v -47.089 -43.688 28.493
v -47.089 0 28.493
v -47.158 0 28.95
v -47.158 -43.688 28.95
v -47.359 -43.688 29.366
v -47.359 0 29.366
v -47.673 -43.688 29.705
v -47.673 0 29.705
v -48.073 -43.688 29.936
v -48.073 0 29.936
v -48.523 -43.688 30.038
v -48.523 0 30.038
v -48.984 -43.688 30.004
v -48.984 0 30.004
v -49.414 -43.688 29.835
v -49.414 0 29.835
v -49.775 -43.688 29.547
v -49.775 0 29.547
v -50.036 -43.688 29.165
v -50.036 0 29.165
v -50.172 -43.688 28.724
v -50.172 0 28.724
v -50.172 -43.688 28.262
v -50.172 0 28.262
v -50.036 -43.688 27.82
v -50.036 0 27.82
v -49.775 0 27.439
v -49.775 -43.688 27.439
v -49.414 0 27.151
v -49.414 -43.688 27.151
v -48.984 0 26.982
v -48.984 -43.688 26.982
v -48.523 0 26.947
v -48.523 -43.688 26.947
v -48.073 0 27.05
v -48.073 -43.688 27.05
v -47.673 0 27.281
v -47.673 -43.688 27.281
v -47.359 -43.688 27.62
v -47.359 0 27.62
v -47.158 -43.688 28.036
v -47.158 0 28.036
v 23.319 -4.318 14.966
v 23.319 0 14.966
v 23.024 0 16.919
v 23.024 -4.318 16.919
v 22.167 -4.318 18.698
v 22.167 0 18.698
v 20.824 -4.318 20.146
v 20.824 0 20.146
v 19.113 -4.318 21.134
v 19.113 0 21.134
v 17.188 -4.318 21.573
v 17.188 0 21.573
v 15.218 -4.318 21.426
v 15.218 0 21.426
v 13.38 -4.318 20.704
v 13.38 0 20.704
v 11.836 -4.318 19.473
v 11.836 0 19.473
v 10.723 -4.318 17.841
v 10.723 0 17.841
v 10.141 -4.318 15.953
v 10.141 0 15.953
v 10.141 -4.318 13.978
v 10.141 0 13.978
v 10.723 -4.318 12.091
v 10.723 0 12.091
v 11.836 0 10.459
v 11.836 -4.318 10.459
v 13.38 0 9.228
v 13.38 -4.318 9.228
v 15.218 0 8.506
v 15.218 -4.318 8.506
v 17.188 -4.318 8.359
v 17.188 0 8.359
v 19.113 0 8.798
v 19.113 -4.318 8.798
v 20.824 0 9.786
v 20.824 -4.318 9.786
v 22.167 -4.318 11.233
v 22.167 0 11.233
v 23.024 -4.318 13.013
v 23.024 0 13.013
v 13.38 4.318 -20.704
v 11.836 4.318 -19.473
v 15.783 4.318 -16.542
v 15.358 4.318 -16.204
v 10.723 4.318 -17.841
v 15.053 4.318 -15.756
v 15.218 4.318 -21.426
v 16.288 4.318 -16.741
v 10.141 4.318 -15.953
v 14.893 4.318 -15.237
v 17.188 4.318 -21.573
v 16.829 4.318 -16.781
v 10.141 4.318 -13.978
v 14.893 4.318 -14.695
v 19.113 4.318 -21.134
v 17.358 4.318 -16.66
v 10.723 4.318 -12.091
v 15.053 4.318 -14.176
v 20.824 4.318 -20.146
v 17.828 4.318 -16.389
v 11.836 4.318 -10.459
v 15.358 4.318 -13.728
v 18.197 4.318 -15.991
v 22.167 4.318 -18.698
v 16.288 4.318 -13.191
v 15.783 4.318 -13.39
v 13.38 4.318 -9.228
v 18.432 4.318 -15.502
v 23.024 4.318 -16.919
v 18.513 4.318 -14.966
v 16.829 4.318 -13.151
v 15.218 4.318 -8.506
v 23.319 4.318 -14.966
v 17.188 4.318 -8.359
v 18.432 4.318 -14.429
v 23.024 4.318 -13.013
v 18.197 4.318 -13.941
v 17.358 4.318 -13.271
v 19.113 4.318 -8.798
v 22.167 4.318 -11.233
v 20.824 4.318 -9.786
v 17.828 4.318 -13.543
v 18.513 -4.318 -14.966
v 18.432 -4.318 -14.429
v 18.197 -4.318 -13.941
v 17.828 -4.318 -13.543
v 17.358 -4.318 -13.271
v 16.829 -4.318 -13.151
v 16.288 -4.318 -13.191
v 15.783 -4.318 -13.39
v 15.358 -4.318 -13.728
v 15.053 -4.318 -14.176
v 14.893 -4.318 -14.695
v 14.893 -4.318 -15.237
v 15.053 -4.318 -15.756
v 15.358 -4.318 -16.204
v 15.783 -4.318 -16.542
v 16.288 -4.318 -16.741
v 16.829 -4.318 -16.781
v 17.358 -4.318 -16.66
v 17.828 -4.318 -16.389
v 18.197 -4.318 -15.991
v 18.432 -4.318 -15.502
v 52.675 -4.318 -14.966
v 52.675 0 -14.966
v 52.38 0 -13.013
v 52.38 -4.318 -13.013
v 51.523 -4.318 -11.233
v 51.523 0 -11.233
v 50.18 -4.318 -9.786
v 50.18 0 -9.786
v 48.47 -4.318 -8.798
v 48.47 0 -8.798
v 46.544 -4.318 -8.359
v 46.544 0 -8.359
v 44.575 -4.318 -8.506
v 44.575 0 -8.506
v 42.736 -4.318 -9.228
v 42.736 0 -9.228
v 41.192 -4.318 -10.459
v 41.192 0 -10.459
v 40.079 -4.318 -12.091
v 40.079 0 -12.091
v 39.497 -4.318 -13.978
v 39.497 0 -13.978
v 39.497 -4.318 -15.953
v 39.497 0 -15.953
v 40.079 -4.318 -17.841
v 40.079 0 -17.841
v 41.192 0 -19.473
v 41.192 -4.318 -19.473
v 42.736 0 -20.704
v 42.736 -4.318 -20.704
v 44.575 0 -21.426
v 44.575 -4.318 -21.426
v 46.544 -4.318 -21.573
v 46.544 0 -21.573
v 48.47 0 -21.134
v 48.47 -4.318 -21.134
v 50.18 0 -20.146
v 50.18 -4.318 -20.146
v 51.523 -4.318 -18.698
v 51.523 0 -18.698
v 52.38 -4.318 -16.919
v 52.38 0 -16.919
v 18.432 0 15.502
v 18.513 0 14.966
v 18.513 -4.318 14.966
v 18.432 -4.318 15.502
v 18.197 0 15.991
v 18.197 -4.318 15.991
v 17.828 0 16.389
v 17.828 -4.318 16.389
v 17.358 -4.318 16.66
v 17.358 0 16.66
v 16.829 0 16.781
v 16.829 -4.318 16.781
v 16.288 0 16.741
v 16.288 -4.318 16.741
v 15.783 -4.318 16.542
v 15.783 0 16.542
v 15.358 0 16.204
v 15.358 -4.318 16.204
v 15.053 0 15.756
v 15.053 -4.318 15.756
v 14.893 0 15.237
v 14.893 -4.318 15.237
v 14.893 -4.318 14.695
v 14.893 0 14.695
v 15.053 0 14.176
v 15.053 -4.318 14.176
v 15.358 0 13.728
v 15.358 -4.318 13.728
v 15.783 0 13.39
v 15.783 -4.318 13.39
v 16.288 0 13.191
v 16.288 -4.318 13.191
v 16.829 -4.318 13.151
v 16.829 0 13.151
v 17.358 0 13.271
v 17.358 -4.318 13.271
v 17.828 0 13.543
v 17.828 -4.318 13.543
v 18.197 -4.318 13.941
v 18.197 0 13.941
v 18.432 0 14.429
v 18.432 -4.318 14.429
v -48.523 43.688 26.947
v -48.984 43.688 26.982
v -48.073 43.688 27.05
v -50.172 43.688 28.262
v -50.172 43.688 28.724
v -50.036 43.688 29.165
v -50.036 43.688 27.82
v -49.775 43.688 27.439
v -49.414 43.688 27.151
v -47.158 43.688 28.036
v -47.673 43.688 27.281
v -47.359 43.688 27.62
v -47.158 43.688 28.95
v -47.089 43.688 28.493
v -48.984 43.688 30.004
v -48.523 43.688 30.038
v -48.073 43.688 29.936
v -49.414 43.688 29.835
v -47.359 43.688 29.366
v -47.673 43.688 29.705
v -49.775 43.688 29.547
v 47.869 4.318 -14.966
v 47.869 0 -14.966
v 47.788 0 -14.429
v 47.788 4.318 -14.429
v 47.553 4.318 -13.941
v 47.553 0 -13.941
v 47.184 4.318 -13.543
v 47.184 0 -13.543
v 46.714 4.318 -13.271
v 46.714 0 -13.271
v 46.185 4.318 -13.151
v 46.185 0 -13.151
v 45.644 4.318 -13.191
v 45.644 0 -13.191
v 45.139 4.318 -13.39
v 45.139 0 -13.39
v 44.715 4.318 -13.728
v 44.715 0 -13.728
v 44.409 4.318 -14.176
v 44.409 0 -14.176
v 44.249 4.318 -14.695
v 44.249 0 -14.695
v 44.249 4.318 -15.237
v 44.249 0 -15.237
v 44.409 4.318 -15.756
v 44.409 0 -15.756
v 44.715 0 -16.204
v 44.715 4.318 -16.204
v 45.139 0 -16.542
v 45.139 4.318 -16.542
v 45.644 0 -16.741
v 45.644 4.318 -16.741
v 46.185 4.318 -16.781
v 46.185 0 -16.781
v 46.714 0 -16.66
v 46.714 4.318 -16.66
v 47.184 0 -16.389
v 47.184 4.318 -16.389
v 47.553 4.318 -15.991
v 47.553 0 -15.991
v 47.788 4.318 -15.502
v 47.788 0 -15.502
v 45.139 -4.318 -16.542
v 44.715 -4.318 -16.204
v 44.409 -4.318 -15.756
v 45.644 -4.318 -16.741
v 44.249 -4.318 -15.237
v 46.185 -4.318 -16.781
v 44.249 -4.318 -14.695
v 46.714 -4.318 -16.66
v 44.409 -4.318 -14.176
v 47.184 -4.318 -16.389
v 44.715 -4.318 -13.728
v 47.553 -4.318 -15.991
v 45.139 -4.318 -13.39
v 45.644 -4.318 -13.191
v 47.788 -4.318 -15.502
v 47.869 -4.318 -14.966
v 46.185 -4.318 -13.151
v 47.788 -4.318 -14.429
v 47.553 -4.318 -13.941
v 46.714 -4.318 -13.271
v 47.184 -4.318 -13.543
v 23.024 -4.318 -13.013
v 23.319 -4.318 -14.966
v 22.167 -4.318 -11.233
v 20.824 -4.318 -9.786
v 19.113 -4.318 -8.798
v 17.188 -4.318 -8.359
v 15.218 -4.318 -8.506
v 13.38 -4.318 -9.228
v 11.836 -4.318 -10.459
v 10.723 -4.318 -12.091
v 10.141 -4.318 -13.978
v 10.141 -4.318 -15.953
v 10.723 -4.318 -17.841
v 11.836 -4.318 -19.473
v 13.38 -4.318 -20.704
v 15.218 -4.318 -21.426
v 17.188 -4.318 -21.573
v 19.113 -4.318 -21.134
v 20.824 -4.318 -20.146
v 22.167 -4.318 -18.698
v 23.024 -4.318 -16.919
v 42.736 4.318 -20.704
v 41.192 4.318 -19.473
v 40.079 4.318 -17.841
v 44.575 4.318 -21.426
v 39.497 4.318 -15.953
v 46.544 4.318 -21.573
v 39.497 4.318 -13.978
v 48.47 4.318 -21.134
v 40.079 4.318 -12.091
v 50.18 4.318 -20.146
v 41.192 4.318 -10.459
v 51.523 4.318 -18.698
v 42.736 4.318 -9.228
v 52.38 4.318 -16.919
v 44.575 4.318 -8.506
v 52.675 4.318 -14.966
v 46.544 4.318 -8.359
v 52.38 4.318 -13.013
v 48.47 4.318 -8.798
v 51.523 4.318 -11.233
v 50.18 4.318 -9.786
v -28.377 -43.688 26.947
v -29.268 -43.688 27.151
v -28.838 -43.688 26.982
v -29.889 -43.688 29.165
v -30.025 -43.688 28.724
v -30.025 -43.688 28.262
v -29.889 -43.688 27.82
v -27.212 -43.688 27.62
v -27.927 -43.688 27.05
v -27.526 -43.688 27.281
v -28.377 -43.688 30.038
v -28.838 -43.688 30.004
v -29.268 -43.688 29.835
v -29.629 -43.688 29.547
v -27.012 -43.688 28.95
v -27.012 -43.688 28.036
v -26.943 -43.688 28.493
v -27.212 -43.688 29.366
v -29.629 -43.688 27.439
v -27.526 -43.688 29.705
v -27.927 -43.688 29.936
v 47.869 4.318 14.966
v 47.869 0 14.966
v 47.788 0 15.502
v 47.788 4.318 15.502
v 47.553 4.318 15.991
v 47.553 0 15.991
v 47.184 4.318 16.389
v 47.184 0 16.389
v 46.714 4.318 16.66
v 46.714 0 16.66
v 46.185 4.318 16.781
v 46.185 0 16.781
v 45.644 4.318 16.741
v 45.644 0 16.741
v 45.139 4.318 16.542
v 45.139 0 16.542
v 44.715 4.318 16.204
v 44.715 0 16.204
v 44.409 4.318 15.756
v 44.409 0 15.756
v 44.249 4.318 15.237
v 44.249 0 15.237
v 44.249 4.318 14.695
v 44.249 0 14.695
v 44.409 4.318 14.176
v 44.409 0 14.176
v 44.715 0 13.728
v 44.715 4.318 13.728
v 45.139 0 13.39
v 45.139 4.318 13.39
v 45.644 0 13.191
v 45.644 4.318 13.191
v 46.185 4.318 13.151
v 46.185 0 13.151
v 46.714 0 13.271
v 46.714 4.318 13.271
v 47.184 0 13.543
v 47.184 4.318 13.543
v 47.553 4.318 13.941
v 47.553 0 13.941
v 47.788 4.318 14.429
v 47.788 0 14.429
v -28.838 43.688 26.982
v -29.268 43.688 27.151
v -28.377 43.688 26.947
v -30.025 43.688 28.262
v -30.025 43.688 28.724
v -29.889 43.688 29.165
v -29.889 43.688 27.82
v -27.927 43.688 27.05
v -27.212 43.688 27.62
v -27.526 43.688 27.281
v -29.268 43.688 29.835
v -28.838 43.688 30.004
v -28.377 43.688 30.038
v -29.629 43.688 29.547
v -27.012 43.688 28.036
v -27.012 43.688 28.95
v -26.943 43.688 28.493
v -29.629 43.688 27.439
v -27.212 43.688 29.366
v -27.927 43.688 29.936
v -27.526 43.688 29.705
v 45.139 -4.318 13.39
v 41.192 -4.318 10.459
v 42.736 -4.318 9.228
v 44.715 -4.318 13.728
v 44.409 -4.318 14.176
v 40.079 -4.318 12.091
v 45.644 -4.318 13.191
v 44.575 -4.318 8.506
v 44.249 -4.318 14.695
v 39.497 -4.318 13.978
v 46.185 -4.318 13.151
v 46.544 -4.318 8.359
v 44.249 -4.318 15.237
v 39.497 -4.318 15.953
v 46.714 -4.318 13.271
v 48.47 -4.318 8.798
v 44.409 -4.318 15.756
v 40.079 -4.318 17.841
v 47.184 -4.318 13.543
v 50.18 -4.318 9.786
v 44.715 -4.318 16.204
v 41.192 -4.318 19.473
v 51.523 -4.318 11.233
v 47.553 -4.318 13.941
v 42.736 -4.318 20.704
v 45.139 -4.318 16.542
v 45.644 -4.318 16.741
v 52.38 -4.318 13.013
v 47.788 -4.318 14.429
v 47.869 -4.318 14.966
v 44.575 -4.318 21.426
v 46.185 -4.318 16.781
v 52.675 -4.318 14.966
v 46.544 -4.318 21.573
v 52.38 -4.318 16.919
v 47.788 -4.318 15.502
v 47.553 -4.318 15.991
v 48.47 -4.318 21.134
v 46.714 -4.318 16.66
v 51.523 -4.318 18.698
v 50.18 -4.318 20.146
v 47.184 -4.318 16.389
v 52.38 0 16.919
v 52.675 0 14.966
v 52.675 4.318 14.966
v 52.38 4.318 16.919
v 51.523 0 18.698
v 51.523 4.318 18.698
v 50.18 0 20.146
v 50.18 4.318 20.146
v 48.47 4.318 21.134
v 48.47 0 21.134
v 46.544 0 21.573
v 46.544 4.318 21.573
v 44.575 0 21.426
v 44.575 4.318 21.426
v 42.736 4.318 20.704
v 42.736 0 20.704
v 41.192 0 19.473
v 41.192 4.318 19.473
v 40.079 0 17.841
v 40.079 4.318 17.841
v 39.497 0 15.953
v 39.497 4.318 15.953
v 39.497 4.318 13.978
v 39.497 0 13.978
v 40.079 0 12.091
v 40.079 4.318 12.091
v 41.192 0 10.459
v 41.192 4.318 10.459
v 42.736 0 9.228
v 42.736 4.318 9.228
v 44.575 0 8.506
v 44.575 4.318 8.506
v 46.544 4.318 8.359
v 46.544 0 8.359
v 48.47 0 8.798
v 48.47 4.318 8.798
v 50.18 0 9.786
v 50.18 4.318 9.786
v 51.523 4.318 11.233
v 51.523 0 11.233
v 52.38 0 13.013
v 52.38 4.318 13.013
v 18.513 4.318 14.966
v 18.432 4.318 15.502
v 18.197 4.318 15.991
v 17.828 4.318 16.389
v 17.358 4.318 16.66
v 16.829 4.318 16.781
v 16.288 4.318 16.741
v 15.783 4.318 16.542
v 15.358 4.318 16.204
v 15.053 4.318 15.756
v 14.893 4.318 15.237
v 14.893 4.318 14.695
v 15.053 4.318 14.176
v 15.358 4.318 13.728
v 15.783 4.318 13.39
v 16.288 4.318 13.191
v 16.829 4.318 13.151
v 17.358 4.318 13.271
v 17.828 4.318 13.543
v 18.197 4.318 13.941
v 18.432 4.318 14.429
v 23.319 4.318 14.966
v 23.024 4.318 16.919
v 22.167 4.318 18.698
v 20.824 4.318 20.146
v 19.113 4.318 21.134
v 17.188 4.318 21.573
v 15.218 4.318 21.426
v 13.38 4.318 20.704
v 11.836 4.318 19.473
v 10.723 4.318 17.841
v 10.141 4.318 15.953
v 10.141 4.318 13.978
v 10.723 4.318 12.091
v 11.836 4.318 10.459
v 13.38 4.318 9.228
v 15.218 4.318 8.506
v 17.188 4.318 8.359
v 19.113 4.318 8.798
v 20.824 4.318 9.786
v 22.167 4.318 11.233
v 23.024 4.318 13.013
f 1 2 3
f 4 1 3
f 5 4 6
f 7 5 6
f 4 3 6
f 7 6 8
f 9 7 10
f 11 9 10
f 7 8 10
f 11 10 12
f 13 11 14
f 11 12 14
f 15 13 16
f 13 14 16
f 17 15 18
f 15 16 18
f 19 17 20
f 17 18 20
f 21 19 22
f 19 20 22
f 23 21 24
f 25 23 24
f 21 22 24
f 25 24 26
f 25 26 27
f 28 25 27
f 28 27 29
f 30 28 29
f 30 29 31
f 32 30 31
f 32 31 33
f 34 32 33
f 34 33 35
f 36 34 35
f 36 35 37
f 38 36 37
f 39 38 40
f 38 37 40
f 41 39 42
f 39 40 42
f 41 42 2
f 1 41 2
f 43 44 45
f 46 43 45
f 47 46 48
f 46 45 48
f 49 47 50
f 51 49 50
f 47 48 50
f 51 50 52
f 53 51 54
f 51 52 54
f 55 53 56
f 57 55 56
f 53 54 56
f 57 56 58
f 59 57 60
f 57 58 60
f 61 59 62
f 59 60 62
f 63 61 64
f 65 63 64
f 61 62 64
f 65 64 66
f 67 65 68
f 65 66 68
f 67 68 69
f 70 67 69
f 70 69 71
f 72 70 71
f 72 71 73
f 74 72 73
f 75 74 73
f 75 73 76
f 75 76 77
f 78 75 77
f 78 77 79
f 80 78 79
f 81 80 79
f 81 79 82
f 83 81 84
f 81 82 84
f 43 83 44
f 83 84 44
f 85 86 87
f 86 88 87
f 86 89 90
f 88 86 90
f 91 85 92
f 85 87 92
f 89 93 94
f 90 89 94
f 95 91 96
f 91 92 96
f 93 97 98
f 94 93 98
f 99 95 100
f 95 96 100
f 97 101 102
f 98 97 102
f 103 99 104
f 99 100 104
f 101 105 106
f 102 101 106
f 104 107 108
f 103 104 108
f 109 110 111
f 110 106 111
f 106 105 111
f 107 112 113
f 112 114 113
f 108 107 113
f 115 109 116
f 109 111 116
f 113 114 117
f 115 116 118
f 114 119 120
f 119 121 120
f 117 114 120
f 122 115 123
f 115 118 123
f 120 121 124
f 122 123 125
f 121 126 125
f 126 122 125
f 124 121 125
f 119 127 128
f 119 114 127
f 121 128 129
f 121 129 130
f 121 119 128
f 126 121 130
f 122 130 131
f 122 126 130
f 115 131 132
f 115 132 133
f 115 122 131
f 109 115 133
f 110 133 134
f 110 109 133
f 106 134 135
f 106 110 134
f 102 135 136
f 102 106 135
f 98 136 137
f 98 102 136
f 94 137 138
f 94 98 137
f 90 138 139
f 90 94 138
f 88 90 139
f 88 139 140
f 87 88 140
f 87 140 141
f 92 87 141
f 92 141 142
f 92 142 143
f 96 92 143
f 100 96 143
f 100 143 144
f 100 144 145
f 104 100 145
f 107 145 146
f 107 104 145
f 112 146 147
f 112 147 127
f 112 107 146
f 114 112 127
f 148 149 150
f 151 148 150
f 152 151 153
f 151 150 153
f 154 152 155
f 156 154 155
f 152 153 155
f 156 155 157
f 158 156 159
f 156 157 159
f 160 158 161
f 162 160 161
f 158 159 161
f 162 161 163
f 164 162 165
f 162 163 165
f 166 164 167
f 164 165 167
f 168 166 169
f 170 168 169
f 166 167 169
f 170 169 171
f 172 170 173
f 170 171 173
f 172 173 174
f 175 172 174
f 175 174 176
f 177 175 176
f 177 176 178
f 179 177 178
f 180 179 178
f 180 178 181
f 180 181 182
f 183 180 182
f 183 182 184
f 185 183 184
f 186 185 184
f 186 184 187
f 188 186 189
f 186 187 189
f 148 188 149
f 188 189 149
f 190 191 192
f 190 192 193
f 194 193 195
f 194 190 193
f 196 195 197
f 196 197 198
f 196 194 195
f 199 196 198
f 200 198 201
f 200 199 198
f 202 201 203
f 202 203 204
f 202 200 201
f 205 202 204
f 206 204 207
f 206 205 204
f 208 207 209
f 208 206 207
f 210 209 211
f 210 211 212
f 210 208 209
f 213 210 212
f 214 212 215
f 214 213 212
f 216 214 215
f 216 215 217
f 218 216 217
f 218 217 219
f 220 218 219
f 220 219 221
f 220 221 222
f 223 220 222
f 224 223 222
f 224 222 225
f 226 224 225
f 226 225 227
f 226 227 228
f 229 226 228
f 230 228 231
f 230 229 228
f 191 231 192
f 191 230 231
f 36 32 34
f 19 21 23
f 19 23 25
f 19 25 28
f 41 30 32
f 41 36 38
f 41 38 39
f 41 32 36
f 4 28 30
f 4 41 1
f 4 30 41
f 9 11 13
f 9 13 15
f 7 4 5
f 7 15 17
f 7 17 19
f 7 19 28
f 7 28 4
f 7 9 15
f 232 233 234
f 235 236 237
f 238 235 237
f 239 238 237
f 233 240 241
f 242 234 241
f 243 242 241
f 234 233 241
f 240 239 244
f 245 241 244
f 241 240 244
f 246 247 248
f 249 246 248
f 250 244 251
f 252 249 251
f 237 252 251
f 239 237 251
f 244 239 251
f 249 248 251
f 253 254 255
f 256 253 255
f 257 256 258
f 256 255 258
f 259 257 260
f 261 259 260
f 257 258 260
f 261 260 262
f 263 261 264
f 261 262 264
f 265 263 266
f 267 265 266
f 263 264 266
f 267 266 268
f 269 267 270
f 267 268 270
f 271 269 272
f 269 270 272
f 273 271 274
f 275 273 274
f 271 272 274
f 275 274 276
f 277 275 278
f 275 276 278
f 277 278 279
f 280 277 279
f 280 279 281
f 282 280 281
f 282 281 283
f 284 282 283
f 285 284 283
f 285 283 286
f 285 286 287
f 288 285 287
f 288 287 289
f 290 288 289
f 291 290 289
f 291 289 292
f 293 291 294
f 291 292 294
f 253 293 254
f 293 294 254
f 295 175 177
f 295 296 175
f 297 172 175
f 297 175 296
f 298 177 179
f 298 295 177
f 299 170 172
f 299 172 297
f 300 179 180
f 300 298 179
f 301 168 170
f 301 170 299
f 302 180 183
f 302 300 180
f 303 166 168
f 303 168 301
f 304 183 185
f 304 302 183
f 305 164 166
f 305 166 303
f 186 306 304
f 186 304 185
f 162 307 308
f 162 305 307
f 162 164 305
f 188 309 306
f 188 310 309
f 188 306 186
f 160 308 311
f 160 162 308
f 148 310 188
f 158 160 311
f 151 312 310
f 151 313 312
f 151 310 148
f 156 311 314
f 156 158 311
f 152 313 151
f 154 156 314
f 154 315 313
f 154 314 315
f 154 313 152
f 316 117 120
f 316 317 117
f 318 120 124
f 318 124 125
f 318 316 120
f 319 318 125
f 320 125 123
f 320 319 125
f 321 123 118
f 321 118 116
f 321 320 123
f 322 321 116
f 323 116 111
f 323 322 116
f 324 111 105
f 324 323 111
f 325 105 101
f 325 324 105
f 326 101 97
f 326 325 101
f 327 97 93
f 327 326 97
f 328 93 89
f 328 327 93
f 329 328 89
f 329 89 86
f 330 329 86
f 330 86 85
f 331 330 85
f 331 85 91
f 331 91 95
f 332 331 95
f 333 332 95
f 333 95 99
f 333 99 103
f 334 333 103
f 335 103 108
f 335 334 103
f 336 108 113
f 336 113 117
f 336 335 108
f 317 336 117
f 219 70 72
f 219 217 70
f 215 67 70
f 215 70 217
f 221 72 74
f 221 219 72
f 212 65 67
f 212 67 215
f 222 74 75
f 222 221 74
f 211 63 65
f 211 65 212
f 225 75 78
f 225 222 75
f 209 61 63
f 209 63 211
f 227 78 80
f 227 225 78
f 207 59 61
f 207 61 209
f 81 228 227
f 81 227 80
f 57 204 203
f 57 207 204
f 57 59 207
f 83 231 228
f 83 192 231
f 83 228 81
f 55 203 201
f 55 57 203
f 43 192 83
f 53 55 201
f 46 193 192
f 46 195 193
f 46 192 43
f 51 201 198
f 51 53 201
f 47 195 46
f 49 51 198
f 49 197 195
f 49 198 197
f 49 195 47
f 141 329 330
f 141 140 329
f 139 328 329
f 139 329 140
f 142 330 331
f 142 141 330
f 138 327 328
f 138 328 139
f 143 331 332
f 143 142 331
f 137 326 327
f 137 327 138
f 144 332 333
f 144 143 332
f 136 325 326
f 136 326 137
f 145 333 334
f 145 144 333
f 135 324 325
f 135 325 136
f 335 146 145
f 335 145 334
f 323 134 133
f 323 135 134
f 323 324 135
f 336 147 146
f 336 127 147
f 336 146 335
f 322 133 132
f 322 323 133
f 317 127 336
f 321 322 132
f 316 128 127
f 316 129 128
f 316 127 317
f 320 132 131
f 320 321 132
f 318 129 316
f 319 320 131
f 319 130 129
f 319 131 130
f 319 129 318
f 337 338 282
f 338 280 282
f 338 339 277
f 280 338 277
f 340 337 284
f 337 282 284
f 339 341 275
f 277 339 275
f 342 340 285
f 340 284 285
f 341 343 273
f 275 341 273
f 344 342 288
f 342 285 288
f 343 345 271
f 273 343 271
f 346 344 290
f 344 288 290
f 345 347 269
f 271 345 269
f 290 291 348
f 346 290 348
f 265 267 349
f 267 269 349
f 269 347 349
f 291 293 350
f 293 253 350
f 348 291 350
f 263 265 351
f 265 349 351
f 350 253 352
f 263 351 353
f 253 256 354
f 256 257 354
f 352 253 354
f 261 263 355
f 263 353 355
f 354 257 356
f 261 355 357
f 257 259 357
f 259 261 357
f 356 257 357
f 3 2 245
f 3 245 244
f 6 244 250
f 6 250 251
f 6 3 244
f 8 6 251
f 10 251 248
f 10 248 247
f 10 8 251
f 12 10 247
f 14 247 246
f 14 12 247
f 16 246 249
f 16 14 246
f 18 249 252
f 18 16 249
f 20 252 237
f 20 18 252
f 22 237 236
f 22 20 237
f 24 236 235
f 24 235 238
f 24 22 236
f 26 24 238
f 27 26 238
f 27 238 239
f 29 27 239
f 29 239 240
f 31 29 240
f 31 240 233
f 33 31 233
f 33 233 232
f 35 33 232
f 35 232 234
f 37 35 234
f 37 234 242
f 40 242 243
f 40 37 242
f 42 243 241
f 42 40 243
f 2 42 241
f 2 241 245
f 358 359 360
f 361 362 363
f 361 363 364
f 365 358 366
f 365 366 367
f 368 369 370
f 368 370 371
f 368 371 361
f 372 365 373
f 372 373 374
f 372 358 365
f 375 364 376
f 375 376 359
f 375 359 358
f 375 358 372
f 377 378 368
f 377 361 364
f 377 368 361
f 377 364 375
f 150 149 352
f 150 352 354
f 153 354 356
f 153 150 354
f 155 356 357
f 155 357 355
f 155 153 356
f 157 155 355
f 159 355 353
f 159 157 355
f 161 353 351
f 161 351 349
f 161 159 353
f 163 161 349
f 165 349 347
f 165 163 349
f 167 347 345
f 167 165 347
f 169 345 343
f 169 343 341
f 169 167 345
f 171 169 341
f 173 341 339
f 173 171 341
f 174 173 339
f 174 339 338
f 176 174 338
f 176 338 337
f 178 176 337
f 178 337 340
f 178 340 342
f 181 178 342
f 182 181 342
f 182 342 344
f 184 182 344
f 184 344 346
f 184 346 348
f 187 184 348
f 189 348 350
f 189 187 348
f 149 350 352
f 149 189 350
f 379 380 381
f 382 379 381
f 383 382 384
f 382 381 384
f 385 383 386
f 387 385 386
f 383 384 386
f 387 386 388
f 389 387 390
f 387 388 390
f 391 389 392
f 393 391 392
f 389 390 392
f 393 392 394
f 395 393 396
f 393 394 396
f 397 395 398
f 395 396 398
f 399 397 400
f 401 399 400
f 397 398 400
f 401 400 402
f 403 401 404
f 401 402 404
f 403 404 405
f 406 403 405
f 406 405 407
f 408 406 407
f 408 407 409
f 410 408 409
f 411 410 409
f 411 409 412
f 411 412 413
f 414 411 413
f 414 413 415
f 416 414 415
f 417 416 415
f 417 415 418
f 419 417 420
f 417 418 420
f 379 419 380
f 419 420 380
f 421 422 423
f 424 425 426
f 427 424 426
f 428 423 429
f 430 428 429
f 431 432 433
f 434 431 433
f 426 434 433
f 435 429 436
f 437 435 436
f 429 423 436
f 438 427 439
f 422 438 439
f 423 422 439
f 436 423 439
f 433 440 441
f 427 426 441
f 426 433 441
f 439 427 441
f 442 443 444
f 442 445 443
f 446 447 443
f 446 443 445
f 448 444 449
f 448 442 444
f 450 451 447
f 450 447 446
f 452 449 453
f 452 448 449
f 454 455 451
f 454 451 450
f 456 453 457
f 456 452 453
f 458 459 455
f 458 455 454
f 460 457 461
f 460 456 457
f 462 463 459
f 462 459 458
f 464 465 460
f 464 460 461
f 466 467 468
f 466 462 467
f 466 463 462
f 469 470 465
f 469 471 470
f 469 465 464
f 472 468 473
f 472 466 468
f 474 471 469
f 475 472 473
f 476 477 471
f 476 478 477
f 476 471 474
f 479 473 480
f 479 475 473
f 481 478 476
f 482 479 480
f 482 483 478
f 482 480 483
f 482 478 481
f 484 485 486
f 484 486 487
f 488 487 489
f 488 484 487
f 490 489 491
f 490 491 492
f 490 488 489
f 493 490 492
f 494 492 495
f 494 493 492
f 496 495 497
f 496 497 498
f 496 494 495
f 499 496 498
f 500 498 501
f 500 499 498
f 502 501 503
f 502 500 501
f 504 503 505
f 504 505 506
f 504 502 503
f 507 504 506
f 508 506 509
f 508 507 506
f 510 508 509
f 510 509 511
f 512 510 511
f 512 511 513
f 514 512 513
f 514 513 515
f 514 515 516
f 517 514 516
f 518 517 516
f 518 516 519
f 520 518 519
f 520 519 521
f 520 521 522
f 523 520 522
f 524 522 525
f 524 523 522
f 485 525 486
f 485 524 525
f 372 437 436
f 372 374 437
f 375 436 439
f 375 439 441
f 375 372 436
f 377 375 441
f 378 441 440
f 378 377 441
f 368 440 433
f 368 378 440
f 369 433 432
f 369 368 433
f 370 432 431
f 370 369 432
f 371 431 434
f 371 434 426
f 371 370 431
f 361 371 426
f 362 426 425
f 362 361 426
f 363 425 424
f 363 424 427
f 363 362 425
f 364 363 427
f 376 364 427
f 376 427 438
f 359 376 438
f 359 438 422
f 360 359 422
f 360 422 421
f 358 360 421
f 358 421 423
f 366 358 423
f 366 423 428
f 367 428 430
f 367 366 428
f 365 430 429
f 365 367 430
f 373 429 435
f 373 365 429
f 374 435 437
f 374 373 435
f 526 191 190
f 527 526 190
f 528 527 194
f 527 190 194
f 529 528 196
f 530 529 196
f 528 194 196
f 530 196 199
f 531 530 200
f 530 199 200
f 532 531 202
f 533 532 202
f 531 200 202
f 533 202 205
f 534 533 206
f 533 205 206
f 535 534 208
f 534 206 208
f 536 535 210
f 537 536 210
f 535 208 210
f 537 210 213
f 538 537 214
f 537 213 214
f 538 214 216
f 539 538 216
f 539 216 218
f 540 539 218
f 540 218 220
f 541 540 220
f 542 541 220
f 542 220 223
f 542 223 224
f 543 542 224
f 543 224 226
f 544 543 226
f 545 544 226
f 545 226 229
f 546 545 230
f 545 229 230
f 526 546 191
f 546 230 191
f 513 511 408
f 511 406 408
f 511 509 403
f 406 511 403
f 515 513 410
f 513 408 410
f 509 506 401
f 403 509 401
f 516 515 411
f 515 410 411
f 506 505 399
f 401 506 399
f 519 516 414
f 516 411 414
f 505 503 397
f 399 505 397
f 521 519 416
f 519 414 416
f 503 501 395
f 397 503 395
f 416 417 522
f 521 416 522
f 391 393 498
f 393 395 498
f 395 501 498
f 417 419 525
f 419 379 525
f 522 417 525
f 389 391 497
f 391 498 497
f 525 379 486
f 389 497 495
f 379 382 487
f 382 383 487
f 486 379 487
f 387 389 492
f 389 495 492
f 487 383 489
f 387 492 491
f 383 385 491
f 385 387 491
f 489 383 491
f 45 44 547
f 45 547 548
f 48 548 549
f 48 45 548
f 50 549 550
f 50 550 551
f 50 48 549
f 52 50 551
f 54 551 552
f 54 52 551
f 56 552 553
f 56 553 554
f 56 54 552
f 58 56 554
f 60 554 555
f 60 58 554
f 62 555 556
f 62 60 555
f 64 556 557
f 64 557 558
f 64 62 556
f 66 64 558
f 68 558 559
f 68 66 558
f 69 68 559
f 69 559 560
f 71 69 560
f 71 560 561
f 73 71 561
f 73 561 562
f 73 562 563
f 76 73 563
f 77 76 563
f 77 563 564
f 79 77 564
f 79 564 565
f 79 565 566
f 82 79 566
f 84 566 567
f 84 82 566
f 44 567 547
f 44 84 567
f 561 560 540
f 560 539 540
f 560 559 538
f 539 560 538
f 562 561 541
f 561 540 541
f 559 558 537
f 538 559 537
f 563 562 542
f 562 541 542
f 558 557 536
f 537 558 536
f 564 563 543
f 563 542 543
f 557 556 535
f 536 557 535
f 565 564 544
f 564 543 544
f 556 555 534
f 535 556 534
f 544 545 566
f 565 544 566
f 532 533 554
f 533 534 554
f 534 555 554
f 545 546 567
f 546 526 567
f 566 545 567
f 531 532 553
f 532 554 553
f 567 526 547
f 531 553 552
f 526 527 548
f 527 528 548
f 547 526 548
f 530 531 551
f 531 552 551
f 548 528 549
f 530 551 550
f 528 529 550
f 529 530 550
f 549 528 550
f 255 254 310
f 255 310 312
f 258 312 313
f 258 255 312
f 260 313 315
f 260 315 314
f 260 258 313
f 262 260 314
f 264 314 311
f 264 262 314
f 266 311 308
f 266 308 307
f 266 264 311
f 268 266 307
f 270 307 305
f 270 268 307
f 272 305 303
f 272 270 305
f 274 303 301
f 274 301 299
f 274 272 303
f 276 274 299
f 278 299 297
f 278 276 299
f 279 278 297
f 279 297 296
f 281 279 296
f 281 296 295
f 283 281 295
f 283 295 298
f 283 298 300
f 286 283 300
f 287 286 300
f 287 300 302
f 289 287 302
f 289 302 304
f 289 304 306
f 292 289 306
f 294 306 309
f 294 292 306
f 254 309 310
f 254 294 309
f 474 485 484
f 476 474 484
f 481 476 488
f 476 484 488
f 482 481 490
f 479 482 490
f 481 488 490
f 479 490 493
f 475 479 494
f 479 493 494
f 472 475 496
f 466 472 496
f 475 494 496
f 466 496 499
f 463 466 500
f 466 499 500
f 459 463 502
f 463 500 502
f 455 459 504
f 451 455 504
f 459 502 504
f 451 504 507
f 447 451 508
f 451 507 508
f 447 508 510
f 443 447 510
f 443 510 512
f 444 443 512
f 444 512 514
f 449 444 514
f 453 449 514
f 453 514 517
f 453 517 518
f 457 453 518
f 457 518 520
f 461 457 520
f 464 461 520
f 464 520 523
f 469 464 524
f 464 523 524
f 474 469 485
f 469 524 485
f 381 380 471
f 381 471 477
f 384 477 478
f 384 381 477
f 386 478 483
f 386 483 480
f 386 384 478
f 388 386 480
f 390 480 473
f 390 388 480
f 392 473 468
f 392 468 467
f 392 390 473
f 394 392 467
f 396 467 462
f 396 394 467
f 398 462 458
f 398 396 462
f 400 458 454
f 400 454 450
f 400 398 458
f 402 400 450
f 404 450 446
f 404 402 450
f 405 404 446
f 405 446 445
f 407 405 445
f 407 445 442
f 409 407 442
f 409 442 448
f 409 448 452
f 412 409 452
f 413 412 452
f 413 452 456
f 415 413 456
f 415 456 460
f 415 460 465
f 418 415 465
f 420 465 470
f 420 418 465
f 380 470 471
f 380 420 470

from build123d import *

# Parameters (mm, degrees)
F0_R     = 1.54988
F0_R_2   = 1.549882
F1_DEPTH = 43.688
F2_R     = 6.625785
F2_R_2   = 1.820241
F3_DEPTH = 4.318


with BuildPart() as f1:
    # F0 (on Front) → F1 (new body, symmetric)
    with BuildSketch(Plane.XZ):
        with Locations((-48.639175, 28.492769)):
            Circle(F0_R)
        with Locations((-28.492769, 28.492769)):
            Circle(F0_R_2)
    extrude(amount=F1_DEPTH, both=True)


with BuildPart() as f3:
    # F2 (on Front) → F3 (new body, symmetric)
    with BuildSketch(Plane.XZ):
        with Locations((46.048921, 14.965899)):
            Circle(F2_R)
        with Locations((46.048921, 14.965899)):
            Circle(F2_R_2, mode=Mode.SUBTRACT)
        with Locations((46.048921, -14.965899)):
            Circle(F2_R)
        with Locations((46.048921, -14.965899)):
            Circle(F2_R_2, mode=Mode.SUBTRACT)
        with Locations((16.692732, 14.965899)):
            Circle(F2_R)
        with Locations((16.692732, 14.965899)):
            Circle(F2_R_2, mode=Mode.SUBTRACT)
        with Locations((16.692732, -14.965899)):
            Circle(F2_R)
        with Locations((16.692732, -14.965899)):
            Circle(F2_R_2, mode=Mode.SUBTRACT)
    extrude(amount=F3_DEPTH, both=True)


solid = Compound([f1.part, f3.part])
